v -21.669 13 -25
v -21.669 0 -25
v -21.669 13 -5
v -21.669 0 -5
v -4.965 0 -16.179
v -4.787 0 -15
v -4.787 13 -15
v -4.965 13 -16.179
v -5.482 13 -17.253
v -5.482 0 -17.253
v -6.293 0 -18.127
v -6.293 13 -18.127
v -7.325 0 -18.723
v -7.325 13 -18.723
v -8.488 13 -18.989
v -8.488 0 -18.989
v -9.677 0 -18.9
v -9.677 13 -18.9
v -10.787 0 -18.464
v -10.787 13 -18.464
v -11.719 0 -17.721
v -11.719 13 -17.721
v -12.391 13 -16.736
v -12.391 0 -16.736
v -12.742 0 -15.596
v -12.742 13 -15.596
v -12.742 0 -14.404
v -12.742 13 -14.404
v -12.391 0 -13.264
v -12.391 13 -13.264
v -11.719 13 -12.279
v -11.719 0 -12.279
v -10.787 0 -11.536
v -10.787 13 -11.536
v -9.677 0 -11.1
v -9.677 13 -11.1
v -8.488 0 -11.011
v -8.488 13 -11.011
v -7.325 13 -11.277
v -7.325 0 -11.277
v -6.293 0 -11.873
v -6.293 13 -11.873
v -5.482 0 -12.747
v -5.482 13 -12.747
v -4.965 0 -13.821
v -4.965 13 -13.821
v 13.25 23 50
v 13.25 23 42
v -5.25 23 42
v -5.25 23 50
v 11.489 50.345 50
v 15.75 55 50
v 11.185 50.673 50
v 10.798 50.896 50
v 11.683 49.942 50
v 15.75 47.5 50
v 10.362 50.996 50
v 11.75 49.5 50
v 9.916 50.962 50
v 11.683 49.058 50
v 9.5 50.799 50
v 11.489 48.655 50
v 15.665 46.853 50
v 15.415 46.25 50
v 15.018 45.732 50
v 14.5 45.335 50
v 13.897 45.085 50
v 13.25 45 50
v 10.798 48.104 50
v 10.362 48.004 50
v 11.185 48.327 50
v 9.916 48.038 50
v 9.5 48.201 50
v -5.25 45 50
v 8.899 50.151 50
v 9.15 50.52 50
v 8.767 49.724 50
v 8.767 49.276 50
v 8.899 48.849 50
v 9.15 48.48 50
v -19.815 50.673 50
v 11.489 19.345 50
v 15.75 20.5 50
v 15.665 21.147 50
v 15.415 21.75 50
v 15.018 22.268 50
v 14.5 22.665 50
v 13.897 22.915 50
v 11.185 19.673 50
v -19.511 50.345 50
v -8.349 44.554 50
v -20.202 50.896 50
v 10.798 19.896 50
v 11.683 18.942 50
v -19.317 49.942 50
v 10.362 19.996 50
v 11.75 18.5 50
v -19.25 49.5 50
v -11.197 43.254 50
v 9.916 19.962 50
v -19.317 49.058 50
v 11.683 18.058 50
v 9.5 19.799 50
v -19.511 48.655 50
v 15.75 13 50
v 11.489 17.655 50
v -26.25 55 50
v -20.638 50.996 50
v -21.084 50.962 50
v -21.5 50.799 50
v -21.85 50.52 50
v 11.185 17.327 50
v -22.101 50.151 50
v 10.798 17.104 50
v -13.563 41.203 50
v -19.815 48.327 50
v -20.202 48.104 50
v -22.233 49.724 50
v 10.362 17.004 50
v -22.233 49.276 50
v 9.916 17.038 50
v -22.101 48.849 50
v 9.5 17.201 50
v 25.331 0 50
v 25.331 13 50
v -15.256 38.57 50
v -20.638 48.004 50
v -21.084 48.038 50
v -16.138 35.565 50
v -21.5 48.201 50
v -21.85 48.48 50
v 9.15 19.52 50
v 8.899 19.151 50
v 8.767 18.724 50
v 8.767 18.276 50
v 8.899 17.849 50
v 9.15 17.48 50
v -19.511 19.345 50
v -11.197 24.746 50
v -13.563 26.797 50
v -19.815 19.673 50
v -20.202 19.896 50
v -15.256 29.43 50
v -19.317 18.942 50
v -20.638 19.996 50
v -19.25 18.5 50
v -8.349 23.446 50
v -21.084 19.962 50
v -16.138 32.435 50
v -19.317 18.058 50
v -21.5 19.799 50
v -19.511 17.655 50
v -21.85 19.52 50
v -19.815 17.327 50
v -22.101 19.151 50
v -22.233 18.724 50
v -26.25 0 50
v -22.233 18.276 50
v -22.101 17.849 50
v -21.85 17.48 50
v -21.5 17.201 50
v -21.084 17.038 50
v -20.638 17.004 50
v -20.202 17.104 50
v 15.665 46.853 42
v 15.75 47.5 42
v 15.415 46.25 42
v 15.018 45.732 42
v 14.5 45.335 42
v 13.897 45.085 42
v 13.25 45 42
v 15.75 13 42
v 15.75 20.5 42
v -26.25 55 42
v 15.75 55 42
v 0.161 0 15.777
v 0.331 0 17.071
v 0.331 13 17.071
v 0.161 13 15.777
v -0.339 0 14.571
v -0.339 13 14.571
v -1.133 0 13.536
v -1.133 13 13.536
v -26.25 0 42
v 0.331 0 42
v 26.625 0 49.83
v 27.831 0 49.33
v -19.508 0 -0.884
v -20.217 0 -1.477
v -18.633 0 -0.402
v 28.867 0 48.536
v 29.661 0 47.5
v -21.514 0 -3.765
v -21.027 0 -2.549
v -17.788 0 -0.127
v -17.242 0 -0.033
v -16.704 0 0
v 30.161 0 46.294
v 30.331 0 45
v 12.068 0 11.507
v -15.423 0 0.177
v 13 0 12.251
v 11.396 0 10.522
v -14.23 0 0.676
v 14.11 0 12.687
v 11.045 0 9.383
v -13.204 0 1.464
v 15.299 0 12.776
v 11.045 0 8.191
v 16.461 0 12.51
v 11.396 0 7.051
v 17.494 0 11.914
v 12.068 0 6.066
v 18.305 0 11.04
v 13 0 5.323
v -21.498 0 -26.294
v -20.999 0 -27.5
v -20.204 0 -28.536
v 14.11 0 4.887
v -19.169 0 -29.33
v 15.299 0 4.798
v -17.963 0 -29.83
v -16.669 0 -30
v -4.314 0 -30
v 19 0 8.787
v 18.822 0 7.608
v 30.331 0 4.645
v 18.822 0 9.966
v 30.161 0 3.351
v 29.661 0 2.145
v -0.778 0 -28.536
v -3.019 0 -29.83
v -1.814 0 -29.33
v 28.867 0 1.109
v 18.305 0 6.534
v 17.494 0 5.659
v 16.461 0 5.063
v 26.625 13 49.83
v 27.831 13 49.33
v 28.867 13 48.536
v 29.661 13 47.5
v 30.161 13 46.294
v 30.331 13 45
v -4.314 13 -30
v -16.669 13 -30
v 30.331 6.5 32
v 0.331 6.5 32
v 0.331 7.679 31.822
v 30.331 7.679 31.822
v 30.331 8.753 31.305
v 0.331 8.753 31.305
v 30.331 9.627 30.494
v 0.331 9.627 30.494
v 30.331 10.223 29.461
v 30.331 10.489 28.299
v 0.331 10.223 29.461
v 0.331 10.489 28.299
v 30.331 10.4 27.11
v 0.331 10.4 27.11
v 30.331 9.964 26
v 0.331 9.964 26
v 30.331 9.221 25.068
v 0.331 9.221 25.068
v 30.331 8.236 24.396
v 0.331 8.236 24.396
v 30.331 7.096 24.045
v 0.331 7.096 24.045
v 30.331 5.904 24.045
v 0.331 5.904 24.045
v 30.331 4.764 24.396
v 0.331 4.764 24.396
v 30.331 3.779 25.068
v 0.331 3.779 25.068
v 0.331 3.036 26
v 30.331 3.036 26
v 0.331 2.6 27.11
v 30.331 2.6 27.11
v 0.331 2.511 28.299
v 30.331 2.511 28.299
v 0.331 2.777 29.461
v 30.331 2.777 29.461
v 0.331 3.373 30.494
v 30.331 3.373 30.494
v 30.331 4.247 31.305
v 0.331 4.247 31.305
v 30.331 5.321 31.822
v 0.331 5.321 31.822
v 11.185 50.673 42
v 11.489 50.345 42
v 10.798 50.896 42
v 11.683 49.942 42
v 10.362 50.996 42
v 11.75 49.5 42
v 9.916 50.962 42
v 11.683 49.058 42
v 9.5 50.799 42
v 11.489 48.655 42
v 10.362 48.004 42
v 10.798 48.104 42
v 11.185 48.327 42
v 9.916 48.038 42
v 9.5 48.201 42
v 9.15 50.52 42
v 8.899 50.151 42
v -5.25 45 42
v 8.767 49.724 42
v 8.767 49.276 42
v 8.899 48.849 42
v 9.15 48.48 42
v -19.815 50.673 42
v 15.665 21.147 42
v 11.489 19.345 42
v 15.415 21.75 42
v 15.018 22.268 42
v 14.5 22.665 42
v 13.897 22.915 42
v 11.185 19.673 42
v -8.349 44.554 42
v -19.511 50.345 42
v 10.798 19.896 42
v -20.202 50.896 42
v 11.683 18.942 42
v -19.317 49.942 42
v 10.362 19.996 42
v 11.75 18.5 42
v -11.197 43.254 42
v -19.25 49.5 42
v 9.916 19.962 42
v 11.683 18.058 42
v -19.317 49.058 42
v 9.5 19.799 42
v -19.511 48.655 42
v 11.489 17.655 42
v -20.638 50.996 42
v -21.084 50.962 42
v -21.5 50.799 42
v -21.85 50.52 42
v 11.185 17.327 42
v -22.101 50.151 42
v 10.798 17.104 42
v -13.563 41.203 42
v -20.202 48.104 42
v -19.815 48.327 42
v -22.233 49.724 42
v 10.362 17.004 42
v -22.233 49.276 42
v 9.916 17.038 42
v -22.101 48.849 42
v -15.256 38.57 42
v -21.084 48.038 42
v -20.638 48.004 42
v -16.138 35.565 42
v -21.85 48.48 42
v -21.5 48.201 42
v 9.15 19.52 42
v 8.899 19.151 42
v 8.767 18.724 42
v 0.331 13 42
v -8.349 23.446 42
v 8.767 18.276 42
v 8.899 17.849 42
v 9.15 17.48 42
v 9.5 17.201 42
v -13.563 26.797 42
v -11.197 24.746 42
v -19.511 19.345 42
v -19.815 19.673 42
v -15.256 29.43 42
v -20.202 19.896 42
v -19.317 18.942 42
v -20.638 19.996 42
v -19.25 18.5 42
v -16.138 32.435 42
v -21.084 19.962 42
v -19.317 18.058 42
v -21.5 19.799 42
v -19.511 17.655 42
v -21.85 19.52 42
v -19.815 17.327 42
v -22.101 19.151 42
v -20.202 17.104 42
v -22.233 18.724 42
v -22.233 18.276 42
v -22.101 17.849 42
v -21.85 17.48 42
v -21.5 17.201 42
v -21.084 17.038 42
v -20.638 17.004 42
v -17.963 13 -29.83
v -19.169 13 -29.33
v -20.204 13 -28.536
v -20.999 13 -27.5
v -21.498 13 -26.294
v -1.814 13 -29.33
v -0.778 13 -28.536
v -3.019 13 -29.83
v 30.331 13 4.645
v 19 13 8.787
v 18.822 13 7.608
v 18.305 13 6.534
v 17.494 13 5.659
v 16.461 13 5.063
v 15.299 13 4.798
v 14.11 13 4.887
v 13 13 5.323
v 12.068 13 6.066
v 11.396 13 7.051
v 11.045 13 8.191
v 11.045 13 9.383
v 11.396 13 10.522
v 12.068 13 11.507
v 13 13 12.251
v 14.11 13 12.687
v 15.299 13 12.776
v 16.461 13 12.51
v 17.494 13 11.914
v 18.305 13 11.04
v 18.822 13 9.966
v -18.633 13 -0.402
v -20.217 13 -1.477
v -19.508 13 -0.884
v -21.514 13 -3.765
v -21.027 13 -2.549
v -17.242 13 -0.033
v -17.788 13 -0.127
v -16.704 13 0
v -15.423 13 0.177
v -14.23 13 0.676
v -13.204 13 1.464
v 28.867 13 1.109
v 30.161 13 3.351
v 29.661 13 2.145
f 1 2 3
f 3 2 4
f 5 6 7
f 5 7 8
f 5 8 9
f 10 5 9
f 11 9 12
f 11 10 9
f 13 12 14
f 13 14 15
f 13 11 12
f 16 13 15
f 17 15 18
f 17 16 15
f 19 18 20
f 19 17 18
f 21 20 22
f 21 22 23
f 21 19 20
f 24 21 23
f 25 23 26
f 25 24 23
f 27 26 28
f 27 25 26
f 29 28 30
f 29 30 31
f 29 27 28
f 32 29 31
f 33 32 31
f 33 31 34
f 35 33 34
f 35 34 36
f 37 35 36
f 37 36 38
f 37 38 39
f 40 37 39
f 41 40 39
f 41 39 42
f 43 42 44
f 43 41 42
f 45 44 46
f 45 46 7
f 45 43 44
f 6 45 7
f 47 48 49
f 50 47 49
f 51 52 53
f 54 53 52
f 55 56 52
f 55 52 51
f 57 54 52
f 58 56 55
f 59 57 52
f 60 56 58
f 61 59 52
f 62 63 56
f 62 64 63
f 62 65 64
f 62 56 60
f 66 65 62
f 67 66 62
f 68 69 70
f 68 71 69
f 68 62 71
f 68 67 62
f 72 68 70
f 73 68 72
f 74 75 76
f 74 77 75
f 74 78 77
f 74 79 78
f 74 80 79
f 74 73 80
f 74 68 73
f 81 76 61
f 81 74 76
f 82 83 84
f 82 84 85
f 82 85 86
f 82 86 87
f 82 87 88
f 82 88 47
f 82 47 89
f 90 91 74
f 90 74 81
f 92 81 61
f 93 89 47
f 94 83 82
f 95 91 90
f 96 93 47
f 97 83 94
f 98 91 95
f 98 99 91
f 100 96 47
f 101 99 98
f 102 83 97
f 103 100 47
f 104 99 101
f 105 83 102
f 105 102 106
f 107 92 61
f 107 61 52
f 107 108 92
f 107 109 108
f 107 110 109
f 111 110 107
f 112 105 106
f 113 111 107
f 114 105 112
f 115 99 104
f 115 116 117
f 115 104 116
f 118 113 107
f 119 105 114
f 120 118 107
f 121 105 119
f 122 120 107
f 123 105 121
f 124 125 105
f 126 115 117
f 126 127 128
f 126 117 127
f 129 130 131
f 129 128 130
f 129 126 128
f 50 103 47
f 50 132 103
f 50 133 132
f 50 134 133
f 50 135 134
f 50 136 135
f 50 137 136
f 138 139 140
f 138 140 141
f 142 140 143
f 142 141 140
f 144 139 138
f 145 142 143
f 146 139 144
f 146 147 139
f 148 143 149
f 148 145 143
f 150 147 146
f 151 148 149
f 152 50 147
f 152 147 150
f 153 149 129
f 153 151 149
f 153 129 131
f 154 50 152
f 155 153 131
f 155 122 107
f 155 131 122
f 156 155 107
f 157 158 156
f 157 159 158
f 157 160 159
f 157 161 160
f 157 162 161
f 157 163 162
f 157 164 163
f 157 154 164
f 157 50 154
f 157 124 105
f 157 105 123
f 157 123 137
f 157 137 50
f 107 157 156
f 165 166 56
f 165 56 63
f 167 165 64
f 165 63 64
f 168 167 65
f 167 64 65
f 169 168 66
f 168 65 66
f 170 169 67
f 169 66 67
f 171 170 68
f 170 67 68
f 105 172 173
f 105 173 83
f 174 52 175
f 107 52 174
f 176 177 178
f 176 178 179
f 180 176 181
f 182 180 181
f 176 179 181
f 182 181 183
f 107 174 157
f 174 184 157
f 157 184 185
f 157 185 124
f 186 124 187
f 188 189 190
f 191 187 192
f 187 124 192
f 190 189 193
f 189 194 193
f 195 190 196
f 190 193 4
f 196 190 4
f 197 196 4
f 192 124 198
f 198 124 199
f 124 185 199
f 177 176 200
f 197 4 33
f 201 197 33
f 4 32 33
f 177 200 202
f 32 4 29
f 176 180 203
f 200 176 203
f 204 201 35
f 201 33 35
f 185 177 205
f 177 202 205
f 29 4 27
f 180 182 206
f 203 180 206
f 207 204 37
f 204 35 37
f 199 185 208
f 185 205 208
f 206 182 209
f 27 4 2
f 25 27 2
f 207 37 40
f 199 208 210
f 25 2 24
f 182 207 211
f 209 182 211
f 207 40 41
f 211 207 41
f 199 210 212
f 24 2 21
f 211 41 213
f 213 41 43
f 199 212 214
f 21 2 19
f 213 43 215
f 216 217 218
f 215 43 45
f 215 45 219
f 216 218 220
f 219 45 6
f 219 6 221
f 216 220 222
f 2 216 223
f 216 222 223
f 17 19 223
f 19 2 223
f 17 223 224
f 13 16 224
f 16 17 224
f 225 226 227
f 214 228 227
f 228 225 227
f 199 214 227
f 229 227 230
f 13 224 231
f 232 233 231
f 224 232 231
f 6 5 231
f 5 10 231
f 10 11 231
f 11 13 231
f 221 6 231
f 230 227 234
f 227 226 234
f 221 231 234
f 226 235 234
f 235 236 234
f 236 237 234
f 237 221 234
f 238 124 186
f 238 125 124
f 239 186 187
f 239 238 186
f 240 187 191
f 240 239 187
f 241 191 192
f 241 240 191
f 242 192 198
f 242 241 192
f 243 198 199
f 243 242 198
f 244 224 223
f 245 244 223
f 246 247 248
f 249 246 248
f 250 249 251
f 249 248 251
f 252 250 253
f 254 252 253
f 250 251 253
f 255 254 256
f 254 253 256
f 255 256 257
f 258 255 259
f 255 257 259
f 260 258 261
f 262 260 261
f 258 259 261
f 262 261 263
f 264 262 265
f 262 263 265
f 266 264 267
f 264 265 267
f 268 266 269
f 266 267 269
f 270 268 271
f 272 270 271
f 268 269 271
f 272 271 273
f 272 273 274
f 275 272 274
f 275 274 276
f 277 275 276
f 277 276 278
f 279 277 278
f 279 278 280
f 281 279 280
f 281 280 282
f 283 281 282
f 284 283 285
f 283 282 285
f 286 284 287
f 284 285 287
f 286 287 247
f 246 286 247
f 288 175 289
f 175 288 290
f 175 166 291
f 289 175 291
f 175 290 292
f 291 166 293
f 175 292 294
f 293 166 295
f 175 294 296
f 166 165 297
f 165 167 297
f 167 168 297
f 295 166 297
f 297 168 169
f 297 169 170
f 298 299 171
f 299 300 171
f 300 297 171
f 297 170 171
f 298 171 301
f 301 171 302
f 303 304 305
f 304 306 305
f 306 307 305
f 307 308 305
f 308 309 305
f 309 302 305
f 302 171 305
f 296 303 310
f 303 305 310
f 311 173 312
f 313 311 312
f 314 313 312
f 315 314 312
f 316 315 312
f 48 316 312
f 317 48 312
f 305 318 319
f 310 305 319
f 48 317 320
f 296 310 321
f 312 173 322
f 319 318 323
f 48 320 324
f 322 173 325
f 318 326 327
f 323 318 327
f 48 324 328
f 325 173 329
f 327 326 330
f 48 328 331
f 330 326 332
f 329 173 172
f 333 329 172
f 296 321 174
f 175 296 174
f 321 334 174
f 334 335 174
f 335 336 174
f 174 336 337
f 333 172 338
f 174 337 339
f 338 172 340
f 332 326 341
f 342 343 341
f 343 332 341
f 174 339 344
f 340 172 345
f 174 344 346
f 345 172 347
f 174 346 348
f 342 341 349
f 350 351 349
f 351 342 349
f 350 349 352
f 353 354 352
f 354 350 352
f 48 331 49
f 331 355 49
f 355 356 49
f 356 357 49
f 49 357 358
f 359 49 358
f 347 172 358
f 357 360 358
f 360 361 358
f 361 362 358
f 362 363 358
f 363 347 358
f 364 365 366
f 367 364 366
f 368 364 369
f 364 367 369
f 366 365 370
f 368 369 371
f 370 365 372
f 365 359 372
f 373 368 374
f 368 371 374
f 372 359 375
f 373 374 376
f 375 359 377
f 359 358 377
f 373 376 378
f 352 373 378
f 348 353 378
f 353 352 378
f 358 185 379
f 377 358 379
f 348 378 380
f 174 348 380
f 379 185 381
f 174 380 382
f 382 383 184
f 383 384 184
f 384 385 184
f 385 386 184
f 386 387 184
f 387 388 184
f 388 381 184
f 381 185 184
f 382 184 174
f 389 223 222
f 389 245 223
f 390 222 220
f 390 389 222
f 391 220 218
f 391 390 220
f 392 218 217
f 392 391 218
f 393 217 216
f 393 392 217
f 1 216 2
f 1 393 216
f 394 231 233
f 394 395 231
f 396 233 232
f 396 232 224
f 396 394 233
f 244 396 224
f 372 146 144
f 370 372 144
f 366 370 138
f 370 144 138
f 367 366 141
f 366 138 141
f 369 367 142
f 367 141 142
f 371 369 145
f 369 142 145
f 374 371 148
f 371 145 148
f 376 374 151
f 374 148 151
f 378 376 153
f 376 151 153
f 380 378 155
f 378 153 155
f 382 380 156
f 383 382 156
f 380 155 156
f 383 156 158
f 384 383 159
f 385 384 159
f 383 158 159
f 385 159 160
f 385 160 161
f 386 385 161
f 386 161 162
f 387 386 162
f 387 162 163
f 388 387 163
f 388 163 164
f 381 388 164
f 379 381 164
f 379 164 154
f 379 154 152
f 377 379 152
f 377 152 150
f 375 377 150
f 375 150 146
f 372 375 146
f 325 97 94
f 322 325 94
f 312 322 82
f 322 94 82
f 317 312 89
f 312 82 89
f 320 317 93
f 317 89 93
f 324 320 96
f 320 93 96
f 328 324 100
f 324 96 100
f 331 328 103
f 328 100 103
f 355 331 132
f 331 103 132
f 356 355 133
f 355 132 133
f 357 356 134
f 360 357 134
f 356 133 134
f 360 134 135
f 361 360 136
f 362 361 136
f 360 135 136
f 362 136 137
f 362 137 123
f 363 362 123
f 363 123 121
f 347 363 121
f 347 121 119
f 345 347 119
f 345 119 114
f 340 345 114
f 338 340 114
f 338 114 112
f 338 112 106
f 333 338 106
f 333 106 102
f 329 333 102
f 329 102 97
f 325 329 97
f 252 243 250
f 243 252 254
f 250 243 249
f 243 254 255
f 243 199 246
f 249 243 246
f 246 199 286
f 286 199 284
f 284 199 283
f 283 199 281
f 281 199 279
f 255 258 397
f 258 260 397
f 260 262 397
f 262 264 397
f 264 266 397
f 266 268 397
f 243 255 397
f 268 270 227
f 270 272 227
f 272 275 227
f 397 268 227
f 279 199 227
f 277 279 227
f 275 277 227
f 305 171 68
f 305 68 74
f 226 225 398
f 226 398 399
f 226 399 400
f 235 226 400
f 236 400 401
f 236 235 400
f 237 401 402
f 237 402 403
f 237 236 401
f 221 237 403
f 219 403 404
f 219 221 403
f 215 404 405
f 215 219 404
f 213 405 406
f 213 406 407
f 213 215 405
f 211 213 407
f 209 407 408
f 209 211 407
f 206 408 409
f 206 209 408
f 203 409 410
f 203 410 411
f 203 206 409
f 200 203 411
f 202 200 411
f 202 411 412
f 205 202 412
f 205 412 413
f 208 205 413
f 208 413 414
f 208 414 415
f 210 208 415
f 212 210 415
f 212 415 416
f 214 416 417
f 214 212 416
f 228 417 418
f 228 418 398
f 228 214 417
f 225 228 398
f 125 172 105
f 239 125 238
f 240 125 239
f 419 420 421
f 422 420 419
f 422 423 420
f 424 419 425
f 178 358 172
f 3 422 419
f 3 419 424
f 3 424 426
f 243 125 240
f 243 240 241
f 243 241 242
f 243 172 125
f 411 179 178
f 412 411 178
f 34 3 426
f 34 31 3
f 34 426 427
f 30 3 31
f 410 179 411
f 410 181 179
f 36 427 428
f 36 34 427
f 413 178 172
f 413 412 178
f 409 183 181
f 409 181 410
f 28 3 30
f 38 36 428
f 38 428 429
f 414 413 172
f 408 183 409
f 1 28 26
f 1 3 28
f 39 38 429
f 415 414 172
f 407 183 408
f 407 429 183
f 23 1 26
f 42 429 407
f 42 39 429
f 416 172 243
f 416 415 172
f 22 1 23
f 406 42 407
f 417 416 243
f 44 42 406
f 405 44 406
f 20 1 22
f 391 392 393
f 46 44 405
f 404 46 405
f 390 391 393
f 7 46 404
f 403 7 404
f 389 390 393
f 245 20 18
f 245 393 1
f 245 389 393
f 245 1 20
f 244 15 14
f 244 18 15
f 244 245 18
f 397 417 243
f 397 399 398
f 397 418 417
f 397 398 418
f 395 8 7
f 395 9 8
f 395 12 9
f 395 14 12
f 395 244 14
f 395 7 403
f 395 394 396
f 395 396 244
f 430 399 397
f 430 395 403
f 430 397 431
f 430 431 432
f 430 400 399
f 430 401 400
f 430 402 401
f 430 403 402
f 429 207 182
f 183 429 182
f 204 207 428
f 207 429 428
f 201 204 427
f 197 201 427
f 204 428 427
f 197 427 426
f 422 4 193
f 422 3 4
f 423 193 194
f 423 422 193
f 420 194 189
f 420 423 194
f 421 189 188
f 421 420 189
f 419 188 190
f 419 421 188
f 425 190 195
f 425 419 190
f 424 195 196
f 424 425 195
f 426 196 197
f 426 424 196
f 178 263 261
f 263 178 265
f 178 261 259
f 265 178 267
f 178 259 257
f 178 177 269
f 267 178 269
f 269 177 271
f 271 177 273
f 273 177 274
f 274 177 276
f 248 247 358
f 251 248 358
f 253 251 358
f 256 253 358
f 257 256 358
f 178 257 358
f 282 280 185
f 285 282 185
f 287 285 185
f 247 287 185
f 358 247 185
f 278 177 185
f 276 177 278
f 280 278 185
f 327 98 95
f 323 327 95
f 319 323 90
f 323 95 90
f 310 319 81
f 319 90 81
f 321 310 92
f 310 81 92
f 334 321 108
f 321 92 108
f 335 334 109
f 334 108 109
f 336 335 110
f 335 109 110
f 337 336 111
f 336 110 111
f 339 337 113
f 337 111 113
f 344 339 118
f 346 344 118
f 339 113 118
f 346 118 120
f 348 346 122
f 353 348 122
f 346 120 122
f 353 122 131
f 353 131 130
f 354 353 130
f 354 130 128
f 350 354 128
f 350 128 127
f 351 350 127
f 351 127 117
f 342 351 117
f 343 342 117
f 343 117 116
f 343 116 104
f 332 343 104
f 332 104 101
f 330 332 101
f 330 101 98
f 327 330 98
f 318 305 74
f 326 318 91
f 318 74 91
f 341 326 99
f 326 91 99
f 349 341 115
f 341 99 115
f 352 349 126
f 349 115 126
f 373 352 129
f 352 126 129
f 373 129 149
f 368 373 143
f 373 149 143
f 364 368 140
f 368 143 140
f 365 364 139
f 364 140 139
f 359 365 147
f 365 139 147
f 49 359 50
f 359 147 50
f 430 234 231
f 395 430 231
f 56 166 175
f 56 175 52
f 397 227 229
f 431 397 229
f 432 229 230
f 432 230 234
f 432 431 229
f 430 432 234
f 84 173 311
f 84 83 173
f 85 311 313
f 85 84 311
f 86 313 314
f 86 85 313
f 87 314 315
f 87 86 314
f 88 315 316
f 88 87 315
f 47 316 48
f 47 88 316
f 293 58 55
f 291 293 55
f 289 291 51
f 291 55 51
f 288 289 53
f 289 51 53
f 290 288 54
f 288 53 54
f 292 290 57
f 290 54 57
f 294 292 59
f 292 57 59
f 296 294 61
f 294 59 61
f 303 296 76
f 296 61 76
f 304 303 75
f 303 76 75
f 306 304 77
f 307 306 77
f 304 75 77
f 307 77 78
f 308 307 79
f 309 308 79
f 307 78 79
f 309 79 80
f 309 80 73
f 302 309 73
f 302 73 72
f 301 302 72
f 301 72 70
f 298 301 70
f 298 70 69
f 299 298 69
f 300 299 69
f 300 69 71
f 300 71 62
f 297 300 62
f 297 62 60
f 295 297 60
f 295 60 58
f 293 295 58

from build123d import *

# Parameters (mm, degrees)
SKETCH1_R       = 4
EXTRUDE1_DEPTH  = 13
FILLET5_R       = 5
FILLET6_R       = 5
SKETCH8_R       = 4
EXTRUDE7_DEPTH  = 30
SKETCH9_W       = 42
SKETCH9_H       = 8
EXTRUDE8_DEPTH  = 42
EXTRUDE9_REACH  = 82
SKETCH10_R      = 11
SKETCH10_R_2    = 1.5
EXTRUDE10_REACH = 10
SKETCH11_W      = 21
SKETCH11_H      = 22
FILLET7_R       = 2.5


with BuildPart() as part:
    # Sketch1 → Extrude1 (new body)
    with BuildSketch(Plane(origin=(0, 0, 0), x_dir=(1, 0, 0), z_dir=(0, 1, 0))):
        Polygon((-26.25, -50), (30.331151632, -50), (30.331151632, -2.573593129), (-2.242441497, 30), (-21.668848368, 30), (-21.668848368, 0), (-14.668848368, 0), (0.331151632, -15), (0.331151632, -42), (-26.25, -42), align=None)
        with Locations((-8.786796564, 15)):
            Circle(SKETCH1_R, mode=Mode.SUBTRACT)
        with Locations((15, -8.786796564)):
            Circle(SKETCH1_R, mode=Mode.SUBTRACT)
    extrude(amount=EXTRUDE1_DEPTH)

    # Fillet5
    fillet5_edges = [part.edges().sort_by_distance(p)[0] for p in [
        (-2.242441497, 6.5, -30),
        (30.331151632, 6.5, 2.573593129),
        (30.331151632, 6.5, 50),
        (0.331151632, 6.5, 15),
        (-14.668848368, 6.5, 0),
    ]]
    fillet(fillet5_edges, radius=FILLET5_R)

    # Fillet6
    fillet6_edges = [part.edges().sort_by_distance(p)[0] for p in [
        (-21.668848368, 6.5, 0),
        (-21.668848368, 6.5, -30),
    ]]
    fillet(fillet6_edges, radius=FILLET6_R)

    # Sketch8 → Extrude7 (cut)
    with BuildSketch(Plane.ZY.offset(-0.331151632)):
        with Locations((28, 6.5)):
            Circle(SKETCH8_R)
    extrude(amount=-EXTRUDE7_DEPTH, mode=Mode.SUBTRACT)

    # Sketch9 → Extrude8 (add)
    with BuildSketch(Plane(origin=(0, 13, 0), x_dir=(-1, 0, 0), z_dir=(0, 1, 0))):
        with Locations((5.25, 46)):
            Rectangle(SKETCH9_W, SKETCH9_H)
    extrude(amount=EXTRUDE8_DEPTH)

    # Sketch10 → Extrude9 (cut, up to next)
    with BuildSketch(Plane.XY.offset(50), mode=Mode.PRIVATE) as extrude9_sk1:
        with Locations((-5.25, 34)):
            Circle(SKETCH10_R)
    extrude9_tool1 = extrude(extrude9_sk1.sketch, amount=-EXTRUDE9_REACH, mode=Mode.PRIVATE) & part.part
    add(extrude9_tool1.solids().sort_by_distance((-5.25, 34, 50))[0], mode=Mode.SUBTRACT)
    # Sketch10 → Extrude9 (cut, up to next)
    with BuildSketch(Plane.XY.offset(50), mode=Mode.PRIVATE) as extrude9_sk2:
        with Locations((10.25, 49.5)):
            Circle(SKETCH10_R_2)
    extrude9_tool2 = extrude(extrude9_sk2.sketch, amount=-EXTRUDE9_REACH, mode=Mode.PRIVATE) & part.part
    add(extrude9_tool2.solids().sort_by_distance((10.25, 49.5, 50))[0], mode=Mode.SUBTRACT)
    # Sketch10 → Extrude9 (cut, up to next)
    with BuildSketch(Plane.XY.offset(50), mode=Mode.PRIVATE) as extrude9_sk3:
        with Locations((-20.75, 49.5)):
            Circle(SKETCH10_R_2)
    extrude9_tool3 = extrude(extrude9_sk3.sketch, amount=-EXTRUDE9_REACH, mode=Mode.PRIVATE) & part.part
    add(extrude9_tool3.solids().sort_by_distance((-20.75, 49.5, 50))[0], mode=Mode.SUBTRACT)
    # Sketch10 → Extrude9 (cut, up to next)
    with BuildSketch(Plane.XY.offset(50), mode=Mode.PRIVATE) as extrude9_sk4:
        with Locations((-20.75, 18.5)):
            Circle(SKETCH10_R_2)
    extrude9_tool4 = extrude(extrude9_sk4.sketch, amount=-EXTRUDE9_REACH, mode=Mode.PRIVATE) & part.part
    add(extrude9_tool4.solids().sort_by_distance((-20.75, 18.5, 50))[0], mode=Mode.SUBTRACT)
    # Sketch10 → Extrude9 (cut, up to next)
    with BuildSketch(Plane.XY.offset(50), mode=Mode.PRIVATE) as extrude9_sk5:
        with Locations((10.25, 18.5)):
            Circle(SKETCH10_R_2)
    extrude9_tool5 = extrude(extrude9_sk5.sketch, amount=-EXTRUDE9_REACH, mode=Mode.PRIVATE) & part.part
    add(extrude9_tool5.solids().sort_by_distance((10.25, 18.5, 50))[0], mode=Mode.SUBTRACT)

    # Sketch11 → Extrude10 (cut, up to next)
    with BuildSketch(Plane(origin=(0, 0, 42), x_dir=(-1, 0, 0), z_dir=(0, 0, -1)), mode=Mode.PRIVATE) as extrude10_sk1:
        with Locations((-5.25, 34)):
            Rectangle(SKETCH11_W, SKETCH11_H)
    extrude10_tool1 = extrude(extrude10_sk1.sketch, amount=-EXTRUDE10_REACH, mode=Mode.PRIVATE) & part.part
    add(extrude10_tool1.solids().sort_by_distance((5.25, 34, 42))[0], mode=Mode.SUBTRACT)

    # Fillet7
    fillet7_edges = [part.edges().sort_by_distance(p)[0] for p in [
        (15.75, 23, 46),
        (15.75, 45, 46),
    ]]
    fillet(fillet7_edges, radius=FILLET7_R)


solid = part.part
